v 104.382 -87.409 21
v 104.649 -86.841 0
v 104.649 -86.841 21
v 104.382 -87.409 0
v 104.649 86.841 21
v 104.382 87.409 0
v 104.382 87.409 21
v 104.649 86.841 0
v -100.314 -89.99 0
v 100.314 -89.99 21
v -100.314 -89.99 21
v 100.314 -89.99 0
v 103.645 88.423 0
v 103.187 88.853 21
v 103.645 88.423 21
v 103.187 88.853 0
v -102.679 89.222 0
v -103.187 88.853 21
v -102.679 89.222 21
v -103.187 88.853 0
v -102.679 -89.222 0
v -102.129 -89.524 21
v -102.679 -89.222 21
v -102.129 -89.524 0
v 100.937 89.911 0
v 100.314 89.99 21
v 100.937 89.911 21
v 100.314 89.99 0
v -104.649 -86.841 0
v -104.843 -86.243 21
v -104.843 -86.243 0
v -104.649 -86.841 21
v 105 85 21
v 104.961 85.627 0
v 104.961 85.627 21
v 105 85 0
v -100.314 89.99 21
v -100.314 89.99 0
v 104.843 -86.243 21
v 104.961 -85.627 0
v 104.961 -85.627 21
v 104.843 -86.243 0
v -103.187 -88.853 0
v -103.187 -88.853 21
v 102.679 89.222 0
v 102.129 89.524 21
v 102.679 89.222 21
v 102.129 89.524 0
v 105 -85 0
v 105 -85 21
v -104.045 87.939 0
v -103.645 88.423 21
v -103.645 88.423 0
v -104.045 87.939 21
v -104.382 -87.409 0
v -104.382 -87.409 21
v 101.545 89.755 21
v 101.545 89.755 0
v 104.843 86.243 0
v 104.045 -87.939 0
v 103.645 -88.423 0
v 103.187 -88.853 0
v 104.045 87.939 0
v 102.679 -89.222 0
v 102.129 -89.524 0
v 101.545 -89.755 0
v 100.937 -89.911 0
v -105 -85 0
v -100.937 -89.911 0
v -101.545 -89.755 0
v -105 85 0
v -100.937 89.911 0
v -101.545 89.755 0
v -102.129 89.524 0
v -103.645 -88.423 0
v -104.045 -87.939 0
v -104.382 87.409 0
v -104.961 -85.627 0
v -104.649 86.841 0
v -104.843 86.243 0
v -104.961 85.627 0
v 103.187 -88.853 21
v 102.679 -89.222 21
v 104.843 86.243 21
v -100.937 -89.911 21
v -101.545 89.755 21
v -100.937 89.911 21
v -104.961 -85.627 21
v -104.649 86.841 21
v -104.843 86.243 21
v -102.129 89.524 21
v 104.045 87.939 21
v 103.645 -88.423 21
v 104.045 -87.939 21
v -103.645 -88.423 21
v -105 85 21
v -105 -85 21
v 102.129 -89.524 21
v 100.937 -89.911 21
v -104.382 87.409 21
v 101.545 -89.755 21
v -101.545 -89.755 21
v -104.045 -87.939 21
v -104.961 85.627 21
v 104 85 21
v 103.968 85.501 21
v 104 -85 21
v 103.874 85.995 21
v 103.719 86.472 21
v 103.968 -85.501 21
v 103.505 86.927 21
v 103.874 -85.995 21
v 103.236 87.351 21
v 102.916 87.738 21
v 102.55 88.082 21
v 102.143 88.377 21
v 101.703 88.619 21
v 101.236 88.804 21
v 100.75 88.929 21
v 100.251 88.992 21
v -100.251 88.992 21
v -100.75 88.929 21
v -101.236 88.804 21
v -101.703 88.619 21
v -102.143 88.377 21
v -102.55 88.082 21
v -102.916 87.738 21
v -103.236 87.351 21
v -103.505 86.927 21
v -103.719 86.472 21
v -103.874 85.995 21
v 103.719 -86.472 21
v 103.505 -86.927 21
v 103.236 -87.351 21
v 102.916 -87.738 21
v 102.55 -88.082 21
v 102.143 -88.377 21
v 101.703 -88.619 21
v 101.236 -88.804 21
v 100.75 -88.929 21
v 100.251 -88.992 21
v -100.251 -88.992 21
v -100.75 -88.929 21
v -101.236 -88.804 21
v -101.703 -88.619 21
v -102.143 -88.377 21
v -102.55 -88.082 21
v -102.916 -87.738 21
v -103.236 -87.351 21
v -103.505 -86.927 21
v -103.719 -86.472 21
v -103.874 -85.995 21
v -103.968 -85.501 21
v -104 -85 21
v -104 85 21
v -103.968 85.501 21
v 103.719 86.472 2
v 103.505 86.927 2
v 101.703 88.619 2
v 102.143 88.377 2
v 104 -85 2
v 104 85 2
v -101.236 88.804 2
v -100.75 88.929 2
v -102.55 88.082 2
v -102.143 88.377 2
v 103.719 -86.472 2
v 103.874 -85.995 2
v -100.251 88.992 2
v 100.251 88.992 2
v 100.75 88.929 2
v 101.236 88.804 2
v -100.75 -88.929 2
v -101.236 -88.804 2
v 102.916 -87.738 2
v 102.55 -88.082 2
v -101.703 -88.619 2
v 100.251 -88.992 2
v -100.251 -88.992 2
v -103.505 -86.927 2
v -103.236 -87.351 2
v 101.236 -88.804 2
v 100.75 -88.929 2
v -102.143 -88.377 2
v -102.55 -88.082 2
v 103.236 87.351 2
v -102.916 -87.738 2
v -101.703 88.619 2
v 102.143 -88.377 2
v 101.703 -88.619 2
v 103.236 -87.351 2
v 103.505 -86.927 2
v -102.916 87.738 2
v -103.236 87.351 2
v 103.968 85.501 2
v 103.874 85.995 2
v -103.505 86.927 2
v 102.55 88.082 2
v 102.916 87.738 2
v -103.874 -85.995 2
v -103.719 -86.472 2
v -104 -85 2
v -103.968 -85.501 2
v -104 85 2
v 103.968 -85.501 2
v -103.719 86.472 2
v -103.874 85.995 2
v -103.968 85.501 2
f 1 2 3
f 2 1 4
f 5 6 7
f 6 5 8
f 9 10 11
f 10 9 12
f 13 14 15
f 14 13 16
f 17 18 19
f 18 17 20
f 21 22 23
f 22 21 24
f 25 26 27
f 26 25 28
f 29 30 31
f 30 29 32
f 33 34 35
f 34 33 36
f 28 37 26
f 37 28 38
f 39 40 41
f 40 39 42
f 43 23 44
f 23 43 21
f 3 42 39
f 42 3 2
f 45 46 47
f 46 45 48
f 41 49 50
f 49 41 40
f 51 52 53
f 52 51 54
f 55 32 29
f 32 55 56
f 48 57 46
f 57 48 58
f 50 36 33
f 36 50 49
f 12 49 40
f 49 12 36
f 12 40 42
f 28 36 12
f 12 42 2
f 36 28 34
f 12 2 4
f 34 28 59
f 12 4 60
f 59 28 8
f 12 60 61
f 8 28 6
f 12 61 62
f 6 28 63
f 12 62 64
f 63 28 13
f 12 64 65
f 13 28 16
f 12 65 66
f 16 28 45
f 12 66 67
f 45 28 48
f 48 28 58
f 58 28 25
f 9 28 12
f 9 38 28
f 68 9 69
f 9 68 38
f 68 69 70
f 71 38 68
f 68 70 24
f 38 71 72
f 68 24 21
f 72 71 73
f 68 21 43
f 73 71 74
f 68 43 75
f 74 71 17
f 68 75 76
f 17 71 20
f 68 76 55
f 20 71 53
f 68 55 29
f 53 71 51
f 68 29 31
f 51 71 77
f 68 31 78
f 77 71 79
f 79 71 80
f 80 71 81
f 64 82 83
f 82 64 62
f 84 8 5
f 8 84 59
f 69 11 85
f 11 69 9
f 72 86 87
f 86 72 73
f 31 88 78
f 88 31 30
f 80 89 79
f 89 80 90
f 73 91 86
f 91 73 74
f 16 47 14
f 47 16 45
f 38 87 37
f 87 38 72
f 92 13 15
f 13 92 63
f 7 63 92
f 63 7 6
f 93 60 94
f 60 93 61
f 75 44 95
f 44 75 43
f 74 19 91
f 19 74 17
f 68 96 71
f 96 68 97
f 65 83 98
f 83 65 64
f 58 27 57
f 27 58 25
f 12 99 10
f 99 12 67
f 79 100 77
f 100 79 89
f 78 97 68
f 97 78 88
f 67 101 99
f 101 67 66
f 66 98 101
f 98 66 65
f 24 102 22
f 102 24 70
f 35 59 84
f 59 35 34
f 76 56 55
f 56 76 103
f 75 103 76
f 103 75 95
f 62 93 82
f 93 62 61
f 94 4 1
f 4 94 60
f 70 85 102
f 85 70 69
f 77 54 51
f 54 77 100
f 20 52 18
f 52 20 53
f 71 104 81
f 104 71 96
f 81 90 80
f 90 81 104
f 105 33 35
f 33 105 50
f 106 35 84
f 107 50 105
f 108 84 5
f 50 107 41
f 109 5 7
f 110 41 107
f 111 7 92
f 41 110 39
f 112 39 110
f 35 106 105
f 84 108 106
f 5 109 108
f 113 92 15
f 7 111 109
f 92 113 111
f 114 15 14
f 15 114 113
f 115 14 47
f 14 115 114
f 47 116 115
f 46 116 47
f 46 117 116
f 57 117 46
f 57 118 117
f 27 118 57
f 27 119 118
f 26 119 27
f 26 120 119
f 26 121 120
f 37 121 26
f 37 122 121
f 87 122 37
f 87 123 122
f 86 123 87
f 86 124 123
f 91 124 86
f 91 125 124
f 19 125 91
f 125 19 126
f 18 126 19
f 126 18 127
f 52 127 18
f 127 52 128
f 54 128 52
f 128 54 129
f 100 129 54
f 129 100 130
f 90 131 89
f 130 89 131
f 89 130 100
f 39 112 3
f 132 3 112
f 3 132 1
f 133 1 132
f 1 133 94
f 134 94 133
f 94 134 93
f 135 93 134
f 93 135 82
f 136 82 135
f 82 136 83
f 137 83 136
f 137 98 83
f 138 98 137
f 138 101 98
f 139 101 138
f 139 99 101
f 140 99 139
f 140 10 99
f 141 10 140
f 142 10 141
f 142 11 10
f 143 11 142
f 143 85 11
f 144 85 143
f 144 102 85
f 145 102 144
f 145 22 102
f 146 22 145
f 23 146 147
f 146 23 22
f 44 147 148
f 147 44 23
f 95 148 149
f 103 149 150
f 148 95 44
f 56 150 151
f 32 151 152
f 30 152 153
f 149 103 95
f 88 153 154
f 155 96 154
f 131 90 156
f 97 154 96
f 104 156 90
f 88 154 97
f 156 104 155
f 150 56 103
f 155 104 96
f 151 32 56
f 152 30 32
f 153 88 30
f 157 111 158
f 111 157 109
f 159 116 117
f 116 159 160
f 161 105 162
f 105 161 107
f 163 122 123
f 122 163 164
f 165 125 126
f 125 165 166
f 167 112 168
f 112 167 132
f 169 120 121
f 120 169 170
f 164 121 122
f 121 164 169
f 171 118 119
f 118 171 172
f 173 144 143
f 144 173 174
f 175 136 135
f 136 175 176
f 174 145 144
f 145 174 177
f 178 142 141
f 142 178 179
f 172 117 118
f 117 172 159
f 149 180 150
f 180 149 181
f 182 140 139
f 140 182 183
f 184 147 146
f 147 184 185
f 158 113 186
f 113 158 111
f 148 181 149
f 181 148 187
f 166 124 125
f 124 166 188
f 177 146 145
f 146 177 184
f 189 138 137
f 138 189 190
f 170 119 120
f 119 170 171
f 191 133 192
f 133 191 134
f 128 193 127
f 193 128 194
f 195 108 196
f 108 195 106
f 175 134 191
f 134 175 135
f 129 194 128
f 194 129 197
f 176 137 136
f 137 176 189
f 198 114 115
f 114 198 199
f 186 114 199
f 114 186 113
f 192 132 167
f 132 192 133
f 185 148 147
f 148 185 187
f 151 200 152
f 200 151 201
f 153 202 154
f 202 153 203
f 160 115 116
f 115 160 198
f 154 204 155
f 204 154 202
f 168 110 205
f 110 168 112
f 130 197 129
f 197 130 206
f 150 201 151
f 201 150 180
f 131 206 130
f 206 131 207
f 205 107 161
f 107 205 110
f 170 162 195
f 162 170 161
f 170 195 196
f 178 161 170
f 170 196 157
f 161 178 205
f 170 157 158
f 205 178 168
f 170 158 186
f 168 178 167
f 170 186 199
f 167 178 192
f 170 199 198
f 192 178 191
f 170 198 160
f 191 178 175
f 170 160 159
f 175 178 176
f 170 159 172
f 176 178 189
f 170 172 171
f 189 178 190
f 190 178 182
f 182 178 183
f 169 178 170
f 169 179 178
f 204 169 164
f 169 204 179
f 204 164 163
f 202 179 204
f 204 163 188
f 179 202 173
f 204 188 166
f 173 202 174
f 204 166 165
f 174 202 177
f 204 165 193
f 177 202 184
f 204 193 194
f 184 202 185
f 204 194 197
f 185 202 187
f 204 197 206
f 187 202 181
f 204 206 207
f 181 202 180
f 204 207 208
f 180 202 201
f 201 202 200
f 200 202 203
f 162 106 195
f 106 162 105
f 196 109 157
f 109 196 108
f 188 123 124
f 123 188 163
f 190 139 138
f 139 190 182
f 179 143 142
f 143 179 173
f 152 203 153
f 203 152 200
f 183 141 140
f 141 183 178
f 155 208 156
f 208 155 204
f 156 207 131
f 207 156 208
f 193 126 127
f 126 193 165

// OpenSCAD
$fn = 50;


difference() {
	union() {
		hull() {
			translate(v = [-100.0000000000, 85.0000000000, 0]) {
				cylinder(h = 21, r = 5);
			}
			translate(v = [100.0000000000, 85.0000000000, 0]) {
				cylinder(h = 21, r = 5);
			}
			translate(v = [-100.0000000000, -85.0000000000, 0]) {
				cylinder(h = 21, r = 5);
			}
			translate(v = [100.0000000000, -85.0000000000, 0]) {
				cylinder(h = 21, r = 5);
			}
		}
	}
	union() {
		translate(v = [0, 0, 2]) {
			hull() {
				translate(v = [-100.0000000000, 85.0000000000, 0]) {
					cylinder(h = 19, r = 4);
				}
				translate(v = [100.0000000000, 85.0000000000, 0]) {
					cylinder(h = 19, r = 4);
				}
				translate(v = [-100.0000000000, -85.0000000000, 0]) {
					cylinder(h = 19, r = 4);
				}
				translate(v = [100.0000000000, -85.0000000000, 0]) {
					cylinder(h = 19, r = 4);
				}
			}
		}
	}
}
